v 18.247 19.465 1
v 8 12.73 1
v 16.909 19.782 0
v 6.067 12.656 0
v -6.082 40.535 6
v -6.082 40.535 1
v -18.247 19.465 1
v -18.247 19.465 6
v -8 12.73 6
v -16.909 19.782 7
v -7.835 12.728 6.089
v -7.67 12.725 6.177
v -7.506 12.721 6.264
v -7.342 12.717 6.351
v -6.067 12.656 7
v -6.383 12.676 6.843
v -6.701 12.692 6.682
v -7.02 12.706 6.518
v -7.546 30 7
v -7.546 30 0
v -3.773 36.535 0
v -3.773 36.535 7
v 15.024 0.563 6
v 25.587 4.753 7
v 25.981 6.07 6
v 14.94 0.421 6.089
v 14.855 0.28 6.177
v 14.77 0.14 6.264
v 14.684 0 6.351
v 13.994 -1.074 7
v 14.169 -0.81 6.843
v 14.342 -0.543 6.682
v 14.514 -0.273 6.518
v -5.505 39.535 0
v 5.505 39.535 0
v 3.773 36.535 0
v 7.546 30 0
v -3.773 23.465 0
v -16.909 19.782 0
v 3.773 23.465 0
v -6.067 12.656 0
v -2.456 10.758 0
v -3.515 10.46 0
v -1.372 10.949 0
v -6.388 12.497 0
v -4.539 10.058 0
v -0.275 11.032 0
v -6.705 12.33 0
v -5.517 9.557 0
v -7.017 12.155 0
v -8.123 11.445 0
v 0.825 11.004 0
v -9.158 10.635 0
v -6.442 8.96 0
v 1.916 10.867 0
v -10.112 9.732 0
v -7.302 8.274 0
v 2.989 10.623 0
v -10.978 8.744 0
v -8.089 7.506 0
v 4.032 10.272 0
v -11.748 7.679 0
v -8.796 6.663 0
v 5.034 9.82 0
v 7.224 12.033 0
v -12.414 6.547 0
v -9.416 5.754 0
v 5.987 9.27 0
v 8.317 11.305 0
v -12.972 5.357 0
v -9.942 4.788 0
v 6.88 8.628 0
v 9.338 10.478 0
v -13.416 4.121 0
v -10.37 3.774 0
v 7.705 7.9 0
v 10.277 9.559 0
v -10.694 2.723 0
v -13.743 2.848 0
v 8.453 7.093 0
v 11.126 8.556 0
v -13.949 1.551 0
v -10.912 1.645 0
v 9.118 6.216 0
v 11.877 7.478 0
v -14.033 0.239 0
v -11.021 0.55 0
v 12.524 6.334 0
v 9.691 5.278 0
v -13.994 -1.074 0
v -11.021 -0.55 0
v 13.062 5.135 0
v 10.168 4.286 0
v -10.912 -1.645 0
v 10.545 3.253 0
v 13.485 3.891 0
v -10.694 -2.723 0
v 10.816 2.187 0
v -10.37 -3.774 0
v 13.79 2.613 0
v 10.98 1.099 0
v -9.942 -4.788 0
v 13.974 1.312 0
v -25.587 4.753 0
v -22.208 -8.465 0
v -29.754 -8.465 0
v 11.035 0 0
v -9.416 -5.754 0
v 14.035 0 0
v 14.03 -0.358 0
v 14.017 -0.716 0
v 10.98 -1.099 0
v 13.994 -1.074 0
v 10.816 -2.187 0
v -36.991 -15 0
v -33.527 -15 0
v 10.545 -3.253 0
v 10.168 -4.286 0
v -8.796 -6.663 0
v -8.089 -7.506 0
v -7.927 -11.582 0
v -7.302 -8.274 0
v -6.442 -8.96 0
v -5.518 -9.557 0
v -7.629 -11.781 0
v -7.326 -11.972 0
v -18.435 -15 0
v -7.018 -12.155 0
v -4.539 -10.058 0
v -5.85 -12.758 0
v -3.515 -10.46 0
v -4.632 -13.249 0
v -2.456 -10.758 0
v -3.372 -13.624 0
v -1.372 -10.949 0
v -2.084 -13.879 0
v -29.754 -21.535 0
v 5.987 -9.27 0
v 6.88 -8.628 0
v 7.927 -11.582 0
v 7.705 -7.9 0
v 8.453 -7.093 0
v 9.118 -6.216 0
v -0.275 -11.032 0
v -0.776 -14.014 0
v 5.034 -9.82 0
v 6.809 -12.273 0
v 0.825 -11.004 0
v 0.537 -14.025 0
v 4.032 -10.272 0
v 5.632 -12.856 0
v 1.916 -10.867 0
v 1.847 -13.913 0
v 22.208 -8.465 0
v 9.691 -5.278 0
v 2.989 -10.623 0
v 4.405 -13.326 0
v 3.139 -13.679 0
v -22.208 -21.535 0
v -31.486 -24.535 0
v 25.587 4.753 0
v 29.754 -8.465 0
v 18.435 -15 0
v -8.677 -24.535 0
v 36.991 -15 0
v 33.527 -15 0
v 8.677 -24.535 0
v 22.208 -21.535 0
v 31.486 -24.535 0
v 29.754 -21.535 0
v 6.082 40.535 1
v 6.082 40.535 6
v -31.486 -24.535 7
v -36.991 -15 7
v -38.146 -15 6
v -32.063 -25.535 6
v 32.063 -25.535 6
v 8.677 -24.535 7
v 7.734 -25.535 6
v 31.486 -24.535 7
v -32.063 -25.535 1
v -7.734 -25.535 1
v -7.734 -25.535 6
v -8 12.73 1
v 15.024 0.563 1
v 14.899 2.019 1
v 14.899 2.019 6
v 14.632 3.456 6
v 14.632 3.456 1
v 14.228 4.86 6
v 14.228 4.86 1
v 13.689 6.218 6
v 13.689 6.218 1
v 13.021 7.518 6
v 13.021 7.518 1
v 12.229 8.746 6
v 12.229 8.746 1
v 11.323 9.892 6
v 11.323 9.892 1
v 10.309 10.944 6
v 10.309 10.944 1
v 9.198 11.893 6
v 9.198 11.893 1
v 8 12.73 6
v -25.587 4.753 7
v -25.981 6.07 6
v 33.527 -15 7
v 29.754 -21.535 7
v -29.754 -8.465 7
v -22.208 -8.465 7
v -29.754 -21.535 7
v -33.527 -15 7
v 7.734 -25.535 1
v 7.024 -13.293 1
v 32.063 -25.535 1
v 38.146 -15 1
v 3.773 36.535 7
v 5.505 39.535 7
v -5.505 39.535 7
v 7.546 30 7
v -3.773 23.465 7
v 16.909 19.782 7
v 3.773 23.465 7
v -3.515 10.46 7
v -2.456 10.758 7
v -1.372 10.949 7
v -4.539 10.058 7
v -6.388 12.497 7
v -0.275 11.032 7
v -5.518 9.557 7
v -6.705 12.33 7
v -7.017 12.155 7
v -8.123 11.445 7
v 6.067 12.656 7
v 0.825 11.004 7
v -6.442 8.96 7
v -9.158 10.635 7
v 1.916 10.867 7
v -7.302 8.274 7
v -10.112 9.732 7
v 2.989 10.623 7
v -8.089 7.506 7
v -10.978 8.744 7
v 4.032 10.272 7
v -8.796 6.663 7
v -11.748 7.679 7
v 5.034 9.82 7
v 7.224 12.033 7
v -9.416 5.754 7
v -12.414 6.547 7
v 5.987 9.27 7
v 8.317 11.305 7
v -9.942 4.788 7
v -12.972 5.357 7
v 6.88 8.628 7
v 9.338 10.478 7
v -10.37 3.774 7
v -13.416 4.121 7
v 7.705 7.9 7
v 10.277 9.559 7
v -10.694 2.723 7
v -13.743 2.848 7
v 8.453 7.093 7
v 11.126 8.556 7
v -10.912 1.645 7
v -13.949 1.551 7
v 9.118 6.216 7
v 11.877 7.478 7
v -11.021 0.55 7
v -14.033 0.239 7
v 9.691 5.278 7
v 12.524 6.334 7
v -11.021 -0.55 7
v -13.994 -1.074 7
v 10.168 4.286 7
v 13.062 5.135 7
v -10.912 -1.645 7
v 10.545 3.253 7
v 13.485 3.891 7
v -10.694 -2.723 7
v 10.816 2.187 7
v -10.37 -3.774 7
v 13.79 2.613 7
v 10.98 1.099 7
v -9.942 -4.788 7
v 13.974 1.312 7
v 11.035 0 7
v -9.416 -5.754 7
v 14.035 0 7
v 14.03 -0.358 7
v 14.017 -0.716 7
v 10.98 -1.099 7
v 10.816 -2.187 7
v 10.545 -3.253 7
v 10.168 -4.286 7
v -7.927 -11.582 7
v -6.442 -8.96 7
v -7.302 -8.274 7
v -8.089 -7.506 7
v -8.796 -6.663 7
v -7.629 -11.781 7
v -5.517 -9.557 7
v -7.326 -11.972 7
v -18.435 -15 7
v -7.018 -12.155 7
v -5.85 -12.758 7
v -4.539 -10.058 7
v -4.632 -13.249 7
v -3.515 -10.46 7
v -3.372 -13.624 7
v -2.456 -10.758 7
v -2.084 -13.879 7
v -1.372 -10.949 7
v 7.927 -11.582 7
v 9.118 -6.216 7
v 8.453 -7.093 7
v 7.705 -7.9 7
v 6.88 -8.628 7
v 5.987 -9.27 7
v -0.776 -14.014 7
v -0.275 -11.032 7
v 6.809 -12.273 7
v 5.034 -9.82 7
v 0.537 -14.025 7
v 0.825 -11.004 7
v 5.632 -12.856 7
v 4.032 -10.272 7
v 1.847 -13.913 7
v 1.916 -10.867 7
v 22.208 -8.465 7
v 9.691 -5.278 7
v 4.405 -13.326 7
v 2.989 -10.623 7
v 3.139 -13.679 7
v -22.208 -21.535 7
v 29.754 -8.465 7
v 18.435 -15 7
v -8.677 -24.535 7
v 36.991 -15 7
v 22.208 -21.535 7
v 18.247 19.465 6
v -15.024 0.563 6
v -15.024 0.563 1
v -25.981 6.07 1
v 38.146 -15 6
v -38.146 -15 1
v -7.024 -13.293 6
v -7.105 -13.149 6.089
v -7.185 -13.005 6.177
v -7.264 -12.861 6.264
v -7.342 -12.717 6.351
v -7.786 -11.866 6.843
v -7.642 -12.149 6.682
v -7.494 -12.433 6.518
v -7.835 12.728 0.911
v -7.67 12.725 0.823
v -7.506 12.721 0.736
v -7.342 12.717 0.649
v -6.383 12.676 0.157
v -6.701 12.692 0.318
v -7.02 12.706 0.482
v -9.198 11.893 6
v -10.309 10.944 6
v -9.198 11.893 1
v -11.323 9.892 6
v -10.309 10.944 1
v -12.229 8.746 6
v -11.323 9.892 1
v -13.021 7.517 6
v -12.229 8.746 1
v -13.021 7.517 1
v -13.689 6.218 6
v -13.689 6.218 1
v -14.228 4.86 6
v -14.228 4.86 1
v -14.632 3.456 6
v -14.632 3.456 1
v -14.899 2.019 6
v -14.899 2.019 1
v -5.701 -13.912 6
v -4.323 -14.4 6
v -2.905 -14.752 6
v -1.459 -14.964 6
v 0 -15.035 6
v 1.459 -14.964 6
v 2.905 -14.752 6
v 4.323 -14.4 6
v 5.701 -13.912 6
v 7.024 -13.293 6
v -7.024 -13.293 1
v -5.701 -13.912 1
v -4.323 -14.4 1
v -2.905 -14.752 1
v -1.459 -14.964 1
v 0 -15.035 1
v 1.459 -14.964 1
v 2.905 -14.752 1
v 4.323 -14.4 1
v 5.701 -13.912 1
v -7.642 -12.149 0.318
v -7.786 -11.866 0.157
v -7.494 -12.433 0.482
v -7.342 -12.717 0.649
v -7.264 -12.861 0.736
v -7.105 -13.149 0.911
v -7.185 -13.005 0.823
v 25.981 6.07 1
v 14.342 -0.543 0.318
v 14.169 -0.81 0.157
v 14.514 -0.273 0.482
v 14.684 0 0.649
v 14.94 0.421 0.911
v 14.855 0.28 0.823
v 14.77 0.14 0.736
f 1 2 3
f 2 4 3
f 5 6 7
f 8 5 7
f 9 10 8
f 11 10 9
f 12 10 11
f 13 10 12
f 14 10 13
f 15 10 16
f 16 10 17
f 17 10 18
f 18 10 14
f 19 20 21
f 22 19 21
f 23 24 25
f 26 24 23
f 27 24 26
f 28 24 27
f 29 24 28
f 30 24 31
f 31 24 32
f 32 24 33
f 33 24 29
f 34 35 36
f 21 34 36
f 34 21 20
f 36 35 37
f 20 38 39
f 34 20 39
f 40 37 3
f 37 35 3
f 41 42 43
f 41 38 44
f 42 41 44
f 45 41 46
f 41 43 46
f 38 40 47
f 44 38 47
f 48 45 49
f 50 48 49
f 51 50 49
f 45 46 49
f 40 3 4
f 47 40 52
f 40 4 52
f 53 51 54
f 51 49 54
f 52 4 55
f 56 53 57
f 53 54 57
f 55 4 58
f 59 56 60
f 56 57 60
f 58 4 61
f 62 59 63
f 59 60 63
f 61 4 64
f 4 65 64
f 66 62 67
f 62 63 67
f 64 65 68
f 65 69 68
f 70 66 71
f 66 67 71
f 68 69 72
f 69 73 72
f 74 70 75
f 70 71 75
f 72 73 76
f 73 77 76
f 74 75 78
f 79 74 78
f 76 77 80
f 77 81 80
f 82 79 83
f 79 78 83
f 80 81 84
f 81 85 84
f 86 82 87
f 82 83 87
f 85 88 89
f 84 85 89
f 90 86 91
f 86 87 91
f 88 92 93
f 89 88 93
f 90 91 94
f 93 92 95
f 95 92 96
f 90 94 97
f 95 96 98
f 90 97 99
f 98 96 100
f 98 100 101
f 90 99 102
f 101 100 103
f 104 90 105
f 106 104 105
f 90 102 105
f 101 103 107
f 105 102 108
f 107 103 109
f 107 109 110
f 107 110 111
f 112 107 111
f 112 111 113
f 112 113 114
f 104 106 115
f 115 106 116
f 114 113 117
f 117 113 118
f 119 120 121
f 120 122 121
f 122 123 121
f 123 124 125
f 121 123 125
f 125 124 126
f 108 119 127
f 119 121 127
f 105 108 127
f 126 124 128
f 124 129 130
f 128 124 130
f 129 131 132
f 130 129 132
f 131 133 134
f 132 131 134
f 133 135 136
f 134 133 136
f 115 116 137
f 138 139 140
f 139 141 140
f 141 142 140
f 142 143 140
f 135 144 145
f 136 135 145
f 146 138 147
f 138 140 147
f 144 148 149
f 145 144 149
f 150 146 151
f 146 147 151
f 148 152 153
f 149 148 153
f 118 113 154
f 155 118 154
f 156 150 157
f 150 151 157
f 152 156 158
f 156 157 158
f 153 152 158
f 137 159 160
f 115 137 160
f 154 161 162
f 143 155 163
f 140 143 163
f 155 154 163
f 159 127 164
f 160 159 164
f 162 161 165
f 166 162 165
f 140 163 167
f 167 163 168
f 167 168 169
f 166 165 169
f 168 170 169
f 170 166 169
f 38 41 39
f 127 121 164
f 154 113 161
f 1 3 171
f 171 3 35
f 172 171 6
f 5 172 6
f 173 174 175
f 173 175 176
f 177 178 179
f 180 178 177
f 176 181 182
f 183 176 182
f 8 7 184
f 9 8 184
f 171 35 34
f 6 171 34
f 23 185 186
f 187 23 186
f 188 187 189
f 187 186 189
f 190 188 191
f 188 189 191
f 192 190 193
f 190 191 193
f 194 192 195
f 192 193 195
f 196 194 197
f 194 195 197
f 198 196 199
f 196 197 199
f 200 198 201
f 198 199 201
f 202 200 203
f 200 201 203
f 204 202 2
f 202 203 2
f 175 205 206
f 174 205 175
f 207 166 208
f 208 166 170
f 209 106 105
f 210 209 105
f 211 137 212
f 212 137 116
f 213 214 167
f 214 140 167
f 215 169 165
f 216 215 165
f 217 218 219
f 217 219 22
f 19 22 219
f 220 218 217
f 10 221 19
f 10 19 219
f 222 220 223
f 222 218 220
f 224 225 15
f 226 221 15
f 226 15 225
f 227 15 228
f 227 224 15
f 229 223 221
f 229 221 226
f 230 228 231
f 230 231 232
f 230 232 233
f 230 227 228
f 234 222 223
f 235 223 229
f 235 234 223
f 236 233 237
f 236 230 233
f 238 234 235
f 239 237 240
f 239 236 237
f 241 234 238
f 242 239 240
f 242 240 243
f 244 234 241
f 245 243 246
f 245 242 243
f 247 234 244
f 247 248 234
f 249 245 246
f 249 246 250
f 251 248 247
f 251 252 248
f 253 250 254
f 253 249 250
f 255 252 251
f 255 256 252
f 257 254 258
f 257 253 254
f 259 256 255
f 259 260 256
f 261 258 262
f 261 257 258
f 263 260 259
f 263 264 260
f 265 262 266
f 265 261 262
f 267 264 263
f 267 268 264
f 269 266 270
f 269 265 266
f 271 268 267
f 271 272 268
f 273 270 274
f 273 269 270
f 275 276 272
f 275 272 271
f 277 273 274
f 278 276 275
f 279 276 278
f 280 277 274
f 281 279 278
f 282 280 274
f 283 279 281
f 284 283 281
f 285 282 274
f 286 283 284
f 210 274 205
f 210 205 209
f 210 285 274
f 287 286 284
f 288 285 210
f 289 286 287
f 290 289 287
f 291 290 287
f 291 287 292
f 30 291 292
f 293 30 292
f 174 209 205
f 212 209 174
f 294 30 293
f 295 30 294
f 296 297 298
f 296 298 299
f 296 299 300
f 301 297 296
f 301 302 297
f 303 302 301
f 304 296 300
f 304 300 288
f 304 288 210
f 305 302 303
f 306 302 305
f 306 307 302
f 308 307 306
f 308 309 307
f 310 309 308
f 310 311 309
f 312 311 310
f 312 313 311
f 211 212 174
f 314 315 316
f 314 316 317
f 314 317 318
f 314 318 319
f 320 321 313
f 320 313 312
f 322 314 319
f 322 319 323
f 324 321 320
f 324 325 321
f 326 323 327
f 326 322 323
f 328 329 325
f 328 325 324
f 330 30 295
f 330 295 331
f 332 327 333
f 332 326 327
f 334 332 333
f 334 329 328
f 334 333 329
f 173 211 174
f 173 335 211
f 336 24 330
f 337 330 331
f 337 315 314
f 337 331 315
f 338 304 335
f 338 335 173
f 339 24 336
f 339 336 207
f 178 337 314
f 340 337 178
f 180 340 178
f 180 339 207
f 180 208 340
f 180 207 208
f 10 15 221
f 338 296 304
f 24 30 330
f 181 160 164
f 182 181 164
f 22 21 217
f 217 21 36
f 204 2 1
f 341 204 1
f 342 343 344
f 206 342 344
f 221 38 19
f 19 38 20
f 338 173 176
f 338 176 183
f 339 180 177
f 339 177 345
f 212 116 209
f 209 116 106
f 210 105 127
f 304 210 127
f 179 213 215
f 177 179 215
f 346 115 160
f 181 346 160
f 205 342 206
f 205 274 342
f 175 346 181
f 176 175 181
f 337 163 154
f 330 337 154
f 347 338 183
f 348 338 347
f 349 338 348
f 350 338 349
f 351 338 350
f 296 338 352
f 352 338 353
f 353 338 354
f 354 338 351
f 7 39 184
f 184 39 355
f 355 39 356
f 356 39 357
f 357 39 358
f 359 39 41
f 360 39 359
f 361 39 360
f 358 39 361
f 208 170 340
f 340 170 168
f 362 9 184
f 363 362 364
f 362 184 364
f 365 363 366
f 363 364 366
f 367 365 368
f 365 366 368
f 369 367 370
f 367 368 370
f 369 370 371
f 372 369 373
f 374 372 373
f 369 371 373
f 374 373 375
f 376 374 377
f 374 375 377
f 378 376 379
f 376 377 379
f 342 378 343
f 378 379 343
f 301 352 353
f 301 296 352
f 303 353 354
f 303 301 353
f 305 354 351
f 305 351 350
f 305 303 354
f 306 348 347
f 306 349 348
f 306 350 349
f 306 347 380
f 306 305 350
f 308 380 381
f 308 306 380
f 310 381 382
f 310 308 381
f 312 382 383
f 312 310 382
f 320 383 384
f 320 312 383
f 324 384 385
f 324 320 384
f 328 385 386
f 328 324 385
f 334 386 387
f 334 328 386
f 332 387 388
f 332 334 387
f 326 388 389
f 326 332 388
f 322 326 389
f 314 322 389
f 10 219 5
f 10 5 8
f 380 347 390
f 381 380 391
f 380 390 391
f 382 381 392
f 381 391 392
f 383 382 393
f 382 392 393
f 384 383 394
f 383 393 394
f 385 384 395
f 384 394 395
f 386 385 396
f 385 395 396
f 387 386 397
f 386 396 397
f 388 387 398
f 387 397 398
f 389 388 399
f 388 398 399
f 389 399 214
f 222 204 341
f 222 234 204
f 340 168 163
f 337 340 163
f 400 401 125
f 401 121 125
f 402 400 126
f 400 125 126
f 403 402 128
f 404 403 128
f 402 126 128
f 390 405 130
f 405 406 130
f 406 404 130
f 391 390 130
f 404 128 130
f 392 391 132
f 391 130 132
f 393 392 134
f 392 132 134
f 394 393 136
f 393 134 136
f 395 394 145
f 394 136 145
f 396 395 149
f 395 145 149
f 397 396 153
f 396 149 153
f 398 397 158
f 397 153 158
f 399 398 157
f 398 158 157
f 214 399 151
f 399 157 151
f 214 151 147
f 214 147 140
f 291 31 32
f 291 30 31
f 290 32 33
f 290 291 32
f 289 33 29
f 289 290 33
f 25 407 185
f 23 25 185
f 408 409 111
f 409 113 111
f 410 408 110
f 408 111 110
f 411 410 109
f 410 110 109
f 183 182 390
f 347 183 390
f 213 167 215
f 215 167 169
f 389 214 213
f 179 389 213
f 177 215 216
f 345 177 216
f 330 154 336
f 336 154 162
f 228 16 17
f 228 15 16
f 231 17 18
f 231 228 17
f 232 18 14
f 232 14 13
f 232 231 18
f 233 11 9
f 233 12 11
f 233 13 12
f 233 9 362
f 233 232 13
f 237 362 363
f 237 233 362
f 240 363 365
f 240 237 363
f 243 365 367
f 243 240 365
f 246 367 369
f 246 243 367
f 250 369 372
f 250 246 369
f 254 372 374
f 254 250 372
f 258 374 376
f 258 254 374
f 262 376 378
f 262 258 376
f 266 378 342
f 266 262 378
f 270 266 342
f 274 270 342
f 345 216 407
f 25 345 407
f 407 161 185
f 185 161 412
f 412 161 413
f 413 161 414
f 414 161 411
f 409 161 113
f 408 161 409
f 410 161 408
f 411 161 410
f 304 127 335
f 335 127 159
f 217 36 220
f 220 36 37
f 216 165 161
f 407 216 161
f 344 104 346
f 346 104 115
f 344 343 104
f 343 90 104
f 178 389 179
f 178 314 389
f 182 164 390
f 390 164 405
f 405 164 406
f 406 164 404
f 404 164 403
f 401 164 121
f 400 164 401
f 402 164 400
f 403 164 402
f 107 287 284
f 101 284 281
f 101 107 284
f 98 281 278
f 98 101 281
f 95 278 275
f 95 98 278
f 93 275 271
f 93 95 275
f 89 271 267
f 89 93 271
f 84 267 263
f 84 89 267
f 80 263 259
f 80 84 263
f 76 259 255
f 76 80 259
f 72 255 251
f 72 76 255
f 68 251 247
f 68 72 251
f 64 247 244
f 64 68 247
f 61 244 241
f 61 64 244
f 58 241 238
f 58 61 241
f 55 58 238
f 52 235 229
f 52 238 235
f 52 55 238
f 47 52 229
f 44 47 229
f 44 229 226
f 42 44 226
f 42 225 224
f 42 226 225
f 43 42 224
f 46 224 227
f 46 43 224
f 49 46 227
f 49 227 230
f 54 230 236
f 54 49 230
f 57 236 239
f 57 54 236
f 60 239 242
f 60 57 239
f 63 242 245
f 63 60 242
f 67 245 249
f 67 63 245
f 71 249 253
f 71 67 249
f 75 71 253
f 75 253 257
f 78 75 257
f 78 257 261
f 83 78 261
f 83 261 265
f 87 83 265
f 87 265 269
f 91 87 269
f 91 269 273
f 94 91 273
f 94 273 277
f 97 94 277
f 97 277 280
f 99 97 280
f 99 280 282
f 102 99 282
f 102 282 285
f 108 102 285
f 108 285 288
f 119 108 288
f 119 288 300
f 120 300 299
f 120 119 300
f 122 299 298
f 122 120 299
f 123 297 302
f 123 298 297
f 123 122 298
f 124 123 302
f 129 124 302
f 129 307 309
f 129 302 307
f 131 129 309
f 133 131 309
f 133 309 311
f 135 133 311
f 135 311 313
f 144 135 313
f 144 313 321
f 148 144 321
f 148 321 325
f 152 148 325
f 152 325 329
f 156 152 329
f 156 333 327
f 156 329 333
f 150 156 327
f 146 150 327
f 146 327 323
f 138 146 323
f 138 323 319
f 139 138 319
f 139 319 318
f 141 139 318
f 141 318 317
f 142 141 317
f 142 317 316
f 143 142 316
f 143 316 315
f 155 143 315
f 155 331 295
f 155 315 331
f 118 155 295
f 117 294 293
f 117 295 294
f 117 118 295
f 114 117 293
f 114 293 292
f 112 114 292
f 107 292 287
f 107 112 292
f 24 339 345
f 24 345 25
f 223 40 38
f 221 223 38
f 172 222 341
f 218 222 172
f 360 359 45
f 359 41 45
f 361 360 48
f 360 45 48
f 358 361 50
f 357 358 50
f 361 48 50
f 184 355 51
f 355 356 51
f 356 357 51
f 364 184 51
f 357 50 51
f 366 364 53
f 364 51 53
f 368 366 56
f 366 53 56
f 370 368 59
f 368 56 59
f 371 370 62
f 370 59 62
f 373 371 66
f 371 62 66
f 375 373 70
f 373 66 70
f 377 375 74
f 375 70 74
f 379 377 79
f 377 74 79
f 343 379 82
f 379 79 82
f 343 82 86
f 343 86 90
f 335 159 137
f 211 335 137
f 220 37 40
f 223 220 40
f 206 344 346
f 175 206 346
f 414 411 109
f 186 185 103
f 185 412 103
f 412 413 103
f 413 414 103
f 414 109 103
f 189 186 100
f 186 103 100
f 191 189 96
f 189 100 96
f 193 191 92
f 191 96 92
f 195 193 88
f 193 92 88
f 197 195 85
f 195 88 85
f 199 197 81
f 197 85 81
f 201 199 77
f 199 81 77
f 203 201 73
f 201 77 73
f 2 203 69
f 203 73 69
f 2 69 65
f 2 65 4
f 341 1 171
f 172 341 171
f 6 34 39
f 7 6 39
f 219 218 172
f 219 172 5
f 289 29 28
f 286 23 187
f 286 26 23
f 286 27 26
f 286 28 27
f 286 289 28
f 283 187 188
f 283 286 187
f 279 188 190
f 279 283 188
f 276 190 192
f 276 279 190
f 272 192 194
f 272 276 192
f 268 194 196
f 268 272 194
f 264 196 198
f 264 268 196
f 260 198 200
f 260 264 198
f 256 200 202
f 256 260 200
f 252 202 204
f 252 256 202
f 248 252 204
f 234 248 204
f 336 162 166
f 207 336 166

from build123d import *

# Parameters (mm, degrees)
F0_R     = 11.035
F2_DEPTH = 7
F3_SIZE  = 1
F4_COUNT = 3


with BuildPart() as f2:
    # F0 (on Top) → F2 (new body)
    with BuildSketch(Plane.XY):
        with BuildLine():
            ThreePointArc((-8, 12.729934), (-7.272249, -13.159241), (15.035, 0))
            ThreePointArc((15.035, 0), (13.159241, 7.272249), (8, 12.729934))
            ThreePointArc((8, 12.729934), (0, 15.035), (-8, 12.729934))
        make_face()
        Circle(F0_R, mode=Mode.SUBTRACT)
        Polygon((6.082385, 19.465), (12.16477, 30), (6.082385, 40.535), (-6.082385, 40.535), (-12.16477, 30), (-6.082385, 19.465), align=None)
        Polygon((7.545968, 30), (3.772984, 23.465), (-3.772984, 23.465), (-7.545968, 30), (-3.772984, 36.535), (3.772984, 36.535), align=None, mode=Mode.SUBTRACT)
        with BuildLine():
            ThreePointArc((-8, 12.729934), (0, 15.035), (8, 12.729934))
            Line((8, 12.729934), (18.247155, 19.465))
            Line((18.247155, 19.465), (12.16477, 30))
            Line((12.16477, 30), (6.082385, 19.465))
            Line((6.082385, 19.465), (-6.082385, 19.465))
            Line((-6.082385, 19.465), (-12.16477, 30))
            Line((-12.16477, 30), (-18.247155, 19.465))
            Line((-18.247155, 19.465), (-8, 12.729934))
        make_face()
    extrude(amount=F2_DEPTH)

    # F3
    f3_edges = [f2.edges().sort_by_distance(p)[0] for p in [
        (12.16477, 30, 7),
        (0, 40.535, 7),
        (-12.16477, 30, 0),
        (13.123578, 16.097467, 7),
        (-13.123578, 16.097467, 7),
        (13.123578, 16.097467, 0),
        (12.16477, 30, 0),
        (0, 40.535, 0),
        (-12.16477, 30, 7),
        (-7.272249, -13.159241, 0),
        (-7.272249, -13.159241, 7),
        (-13.123578, 16.097467, 0),
    ]]
    chamfer(f3_edges, length=F3_SIZE)

    # F4: F2 ×3 about axis
    f4_axis = Axis((0, 0, 32.696605), (0, 0, 1))


with BuildPart() as f2_1:
    add(f2.part)
    for i in range(1, F4_COUNT):
        add(f2.part.rotate(f4_axis, i * 360 / F4_COUNT))


solid = f2_1.part
